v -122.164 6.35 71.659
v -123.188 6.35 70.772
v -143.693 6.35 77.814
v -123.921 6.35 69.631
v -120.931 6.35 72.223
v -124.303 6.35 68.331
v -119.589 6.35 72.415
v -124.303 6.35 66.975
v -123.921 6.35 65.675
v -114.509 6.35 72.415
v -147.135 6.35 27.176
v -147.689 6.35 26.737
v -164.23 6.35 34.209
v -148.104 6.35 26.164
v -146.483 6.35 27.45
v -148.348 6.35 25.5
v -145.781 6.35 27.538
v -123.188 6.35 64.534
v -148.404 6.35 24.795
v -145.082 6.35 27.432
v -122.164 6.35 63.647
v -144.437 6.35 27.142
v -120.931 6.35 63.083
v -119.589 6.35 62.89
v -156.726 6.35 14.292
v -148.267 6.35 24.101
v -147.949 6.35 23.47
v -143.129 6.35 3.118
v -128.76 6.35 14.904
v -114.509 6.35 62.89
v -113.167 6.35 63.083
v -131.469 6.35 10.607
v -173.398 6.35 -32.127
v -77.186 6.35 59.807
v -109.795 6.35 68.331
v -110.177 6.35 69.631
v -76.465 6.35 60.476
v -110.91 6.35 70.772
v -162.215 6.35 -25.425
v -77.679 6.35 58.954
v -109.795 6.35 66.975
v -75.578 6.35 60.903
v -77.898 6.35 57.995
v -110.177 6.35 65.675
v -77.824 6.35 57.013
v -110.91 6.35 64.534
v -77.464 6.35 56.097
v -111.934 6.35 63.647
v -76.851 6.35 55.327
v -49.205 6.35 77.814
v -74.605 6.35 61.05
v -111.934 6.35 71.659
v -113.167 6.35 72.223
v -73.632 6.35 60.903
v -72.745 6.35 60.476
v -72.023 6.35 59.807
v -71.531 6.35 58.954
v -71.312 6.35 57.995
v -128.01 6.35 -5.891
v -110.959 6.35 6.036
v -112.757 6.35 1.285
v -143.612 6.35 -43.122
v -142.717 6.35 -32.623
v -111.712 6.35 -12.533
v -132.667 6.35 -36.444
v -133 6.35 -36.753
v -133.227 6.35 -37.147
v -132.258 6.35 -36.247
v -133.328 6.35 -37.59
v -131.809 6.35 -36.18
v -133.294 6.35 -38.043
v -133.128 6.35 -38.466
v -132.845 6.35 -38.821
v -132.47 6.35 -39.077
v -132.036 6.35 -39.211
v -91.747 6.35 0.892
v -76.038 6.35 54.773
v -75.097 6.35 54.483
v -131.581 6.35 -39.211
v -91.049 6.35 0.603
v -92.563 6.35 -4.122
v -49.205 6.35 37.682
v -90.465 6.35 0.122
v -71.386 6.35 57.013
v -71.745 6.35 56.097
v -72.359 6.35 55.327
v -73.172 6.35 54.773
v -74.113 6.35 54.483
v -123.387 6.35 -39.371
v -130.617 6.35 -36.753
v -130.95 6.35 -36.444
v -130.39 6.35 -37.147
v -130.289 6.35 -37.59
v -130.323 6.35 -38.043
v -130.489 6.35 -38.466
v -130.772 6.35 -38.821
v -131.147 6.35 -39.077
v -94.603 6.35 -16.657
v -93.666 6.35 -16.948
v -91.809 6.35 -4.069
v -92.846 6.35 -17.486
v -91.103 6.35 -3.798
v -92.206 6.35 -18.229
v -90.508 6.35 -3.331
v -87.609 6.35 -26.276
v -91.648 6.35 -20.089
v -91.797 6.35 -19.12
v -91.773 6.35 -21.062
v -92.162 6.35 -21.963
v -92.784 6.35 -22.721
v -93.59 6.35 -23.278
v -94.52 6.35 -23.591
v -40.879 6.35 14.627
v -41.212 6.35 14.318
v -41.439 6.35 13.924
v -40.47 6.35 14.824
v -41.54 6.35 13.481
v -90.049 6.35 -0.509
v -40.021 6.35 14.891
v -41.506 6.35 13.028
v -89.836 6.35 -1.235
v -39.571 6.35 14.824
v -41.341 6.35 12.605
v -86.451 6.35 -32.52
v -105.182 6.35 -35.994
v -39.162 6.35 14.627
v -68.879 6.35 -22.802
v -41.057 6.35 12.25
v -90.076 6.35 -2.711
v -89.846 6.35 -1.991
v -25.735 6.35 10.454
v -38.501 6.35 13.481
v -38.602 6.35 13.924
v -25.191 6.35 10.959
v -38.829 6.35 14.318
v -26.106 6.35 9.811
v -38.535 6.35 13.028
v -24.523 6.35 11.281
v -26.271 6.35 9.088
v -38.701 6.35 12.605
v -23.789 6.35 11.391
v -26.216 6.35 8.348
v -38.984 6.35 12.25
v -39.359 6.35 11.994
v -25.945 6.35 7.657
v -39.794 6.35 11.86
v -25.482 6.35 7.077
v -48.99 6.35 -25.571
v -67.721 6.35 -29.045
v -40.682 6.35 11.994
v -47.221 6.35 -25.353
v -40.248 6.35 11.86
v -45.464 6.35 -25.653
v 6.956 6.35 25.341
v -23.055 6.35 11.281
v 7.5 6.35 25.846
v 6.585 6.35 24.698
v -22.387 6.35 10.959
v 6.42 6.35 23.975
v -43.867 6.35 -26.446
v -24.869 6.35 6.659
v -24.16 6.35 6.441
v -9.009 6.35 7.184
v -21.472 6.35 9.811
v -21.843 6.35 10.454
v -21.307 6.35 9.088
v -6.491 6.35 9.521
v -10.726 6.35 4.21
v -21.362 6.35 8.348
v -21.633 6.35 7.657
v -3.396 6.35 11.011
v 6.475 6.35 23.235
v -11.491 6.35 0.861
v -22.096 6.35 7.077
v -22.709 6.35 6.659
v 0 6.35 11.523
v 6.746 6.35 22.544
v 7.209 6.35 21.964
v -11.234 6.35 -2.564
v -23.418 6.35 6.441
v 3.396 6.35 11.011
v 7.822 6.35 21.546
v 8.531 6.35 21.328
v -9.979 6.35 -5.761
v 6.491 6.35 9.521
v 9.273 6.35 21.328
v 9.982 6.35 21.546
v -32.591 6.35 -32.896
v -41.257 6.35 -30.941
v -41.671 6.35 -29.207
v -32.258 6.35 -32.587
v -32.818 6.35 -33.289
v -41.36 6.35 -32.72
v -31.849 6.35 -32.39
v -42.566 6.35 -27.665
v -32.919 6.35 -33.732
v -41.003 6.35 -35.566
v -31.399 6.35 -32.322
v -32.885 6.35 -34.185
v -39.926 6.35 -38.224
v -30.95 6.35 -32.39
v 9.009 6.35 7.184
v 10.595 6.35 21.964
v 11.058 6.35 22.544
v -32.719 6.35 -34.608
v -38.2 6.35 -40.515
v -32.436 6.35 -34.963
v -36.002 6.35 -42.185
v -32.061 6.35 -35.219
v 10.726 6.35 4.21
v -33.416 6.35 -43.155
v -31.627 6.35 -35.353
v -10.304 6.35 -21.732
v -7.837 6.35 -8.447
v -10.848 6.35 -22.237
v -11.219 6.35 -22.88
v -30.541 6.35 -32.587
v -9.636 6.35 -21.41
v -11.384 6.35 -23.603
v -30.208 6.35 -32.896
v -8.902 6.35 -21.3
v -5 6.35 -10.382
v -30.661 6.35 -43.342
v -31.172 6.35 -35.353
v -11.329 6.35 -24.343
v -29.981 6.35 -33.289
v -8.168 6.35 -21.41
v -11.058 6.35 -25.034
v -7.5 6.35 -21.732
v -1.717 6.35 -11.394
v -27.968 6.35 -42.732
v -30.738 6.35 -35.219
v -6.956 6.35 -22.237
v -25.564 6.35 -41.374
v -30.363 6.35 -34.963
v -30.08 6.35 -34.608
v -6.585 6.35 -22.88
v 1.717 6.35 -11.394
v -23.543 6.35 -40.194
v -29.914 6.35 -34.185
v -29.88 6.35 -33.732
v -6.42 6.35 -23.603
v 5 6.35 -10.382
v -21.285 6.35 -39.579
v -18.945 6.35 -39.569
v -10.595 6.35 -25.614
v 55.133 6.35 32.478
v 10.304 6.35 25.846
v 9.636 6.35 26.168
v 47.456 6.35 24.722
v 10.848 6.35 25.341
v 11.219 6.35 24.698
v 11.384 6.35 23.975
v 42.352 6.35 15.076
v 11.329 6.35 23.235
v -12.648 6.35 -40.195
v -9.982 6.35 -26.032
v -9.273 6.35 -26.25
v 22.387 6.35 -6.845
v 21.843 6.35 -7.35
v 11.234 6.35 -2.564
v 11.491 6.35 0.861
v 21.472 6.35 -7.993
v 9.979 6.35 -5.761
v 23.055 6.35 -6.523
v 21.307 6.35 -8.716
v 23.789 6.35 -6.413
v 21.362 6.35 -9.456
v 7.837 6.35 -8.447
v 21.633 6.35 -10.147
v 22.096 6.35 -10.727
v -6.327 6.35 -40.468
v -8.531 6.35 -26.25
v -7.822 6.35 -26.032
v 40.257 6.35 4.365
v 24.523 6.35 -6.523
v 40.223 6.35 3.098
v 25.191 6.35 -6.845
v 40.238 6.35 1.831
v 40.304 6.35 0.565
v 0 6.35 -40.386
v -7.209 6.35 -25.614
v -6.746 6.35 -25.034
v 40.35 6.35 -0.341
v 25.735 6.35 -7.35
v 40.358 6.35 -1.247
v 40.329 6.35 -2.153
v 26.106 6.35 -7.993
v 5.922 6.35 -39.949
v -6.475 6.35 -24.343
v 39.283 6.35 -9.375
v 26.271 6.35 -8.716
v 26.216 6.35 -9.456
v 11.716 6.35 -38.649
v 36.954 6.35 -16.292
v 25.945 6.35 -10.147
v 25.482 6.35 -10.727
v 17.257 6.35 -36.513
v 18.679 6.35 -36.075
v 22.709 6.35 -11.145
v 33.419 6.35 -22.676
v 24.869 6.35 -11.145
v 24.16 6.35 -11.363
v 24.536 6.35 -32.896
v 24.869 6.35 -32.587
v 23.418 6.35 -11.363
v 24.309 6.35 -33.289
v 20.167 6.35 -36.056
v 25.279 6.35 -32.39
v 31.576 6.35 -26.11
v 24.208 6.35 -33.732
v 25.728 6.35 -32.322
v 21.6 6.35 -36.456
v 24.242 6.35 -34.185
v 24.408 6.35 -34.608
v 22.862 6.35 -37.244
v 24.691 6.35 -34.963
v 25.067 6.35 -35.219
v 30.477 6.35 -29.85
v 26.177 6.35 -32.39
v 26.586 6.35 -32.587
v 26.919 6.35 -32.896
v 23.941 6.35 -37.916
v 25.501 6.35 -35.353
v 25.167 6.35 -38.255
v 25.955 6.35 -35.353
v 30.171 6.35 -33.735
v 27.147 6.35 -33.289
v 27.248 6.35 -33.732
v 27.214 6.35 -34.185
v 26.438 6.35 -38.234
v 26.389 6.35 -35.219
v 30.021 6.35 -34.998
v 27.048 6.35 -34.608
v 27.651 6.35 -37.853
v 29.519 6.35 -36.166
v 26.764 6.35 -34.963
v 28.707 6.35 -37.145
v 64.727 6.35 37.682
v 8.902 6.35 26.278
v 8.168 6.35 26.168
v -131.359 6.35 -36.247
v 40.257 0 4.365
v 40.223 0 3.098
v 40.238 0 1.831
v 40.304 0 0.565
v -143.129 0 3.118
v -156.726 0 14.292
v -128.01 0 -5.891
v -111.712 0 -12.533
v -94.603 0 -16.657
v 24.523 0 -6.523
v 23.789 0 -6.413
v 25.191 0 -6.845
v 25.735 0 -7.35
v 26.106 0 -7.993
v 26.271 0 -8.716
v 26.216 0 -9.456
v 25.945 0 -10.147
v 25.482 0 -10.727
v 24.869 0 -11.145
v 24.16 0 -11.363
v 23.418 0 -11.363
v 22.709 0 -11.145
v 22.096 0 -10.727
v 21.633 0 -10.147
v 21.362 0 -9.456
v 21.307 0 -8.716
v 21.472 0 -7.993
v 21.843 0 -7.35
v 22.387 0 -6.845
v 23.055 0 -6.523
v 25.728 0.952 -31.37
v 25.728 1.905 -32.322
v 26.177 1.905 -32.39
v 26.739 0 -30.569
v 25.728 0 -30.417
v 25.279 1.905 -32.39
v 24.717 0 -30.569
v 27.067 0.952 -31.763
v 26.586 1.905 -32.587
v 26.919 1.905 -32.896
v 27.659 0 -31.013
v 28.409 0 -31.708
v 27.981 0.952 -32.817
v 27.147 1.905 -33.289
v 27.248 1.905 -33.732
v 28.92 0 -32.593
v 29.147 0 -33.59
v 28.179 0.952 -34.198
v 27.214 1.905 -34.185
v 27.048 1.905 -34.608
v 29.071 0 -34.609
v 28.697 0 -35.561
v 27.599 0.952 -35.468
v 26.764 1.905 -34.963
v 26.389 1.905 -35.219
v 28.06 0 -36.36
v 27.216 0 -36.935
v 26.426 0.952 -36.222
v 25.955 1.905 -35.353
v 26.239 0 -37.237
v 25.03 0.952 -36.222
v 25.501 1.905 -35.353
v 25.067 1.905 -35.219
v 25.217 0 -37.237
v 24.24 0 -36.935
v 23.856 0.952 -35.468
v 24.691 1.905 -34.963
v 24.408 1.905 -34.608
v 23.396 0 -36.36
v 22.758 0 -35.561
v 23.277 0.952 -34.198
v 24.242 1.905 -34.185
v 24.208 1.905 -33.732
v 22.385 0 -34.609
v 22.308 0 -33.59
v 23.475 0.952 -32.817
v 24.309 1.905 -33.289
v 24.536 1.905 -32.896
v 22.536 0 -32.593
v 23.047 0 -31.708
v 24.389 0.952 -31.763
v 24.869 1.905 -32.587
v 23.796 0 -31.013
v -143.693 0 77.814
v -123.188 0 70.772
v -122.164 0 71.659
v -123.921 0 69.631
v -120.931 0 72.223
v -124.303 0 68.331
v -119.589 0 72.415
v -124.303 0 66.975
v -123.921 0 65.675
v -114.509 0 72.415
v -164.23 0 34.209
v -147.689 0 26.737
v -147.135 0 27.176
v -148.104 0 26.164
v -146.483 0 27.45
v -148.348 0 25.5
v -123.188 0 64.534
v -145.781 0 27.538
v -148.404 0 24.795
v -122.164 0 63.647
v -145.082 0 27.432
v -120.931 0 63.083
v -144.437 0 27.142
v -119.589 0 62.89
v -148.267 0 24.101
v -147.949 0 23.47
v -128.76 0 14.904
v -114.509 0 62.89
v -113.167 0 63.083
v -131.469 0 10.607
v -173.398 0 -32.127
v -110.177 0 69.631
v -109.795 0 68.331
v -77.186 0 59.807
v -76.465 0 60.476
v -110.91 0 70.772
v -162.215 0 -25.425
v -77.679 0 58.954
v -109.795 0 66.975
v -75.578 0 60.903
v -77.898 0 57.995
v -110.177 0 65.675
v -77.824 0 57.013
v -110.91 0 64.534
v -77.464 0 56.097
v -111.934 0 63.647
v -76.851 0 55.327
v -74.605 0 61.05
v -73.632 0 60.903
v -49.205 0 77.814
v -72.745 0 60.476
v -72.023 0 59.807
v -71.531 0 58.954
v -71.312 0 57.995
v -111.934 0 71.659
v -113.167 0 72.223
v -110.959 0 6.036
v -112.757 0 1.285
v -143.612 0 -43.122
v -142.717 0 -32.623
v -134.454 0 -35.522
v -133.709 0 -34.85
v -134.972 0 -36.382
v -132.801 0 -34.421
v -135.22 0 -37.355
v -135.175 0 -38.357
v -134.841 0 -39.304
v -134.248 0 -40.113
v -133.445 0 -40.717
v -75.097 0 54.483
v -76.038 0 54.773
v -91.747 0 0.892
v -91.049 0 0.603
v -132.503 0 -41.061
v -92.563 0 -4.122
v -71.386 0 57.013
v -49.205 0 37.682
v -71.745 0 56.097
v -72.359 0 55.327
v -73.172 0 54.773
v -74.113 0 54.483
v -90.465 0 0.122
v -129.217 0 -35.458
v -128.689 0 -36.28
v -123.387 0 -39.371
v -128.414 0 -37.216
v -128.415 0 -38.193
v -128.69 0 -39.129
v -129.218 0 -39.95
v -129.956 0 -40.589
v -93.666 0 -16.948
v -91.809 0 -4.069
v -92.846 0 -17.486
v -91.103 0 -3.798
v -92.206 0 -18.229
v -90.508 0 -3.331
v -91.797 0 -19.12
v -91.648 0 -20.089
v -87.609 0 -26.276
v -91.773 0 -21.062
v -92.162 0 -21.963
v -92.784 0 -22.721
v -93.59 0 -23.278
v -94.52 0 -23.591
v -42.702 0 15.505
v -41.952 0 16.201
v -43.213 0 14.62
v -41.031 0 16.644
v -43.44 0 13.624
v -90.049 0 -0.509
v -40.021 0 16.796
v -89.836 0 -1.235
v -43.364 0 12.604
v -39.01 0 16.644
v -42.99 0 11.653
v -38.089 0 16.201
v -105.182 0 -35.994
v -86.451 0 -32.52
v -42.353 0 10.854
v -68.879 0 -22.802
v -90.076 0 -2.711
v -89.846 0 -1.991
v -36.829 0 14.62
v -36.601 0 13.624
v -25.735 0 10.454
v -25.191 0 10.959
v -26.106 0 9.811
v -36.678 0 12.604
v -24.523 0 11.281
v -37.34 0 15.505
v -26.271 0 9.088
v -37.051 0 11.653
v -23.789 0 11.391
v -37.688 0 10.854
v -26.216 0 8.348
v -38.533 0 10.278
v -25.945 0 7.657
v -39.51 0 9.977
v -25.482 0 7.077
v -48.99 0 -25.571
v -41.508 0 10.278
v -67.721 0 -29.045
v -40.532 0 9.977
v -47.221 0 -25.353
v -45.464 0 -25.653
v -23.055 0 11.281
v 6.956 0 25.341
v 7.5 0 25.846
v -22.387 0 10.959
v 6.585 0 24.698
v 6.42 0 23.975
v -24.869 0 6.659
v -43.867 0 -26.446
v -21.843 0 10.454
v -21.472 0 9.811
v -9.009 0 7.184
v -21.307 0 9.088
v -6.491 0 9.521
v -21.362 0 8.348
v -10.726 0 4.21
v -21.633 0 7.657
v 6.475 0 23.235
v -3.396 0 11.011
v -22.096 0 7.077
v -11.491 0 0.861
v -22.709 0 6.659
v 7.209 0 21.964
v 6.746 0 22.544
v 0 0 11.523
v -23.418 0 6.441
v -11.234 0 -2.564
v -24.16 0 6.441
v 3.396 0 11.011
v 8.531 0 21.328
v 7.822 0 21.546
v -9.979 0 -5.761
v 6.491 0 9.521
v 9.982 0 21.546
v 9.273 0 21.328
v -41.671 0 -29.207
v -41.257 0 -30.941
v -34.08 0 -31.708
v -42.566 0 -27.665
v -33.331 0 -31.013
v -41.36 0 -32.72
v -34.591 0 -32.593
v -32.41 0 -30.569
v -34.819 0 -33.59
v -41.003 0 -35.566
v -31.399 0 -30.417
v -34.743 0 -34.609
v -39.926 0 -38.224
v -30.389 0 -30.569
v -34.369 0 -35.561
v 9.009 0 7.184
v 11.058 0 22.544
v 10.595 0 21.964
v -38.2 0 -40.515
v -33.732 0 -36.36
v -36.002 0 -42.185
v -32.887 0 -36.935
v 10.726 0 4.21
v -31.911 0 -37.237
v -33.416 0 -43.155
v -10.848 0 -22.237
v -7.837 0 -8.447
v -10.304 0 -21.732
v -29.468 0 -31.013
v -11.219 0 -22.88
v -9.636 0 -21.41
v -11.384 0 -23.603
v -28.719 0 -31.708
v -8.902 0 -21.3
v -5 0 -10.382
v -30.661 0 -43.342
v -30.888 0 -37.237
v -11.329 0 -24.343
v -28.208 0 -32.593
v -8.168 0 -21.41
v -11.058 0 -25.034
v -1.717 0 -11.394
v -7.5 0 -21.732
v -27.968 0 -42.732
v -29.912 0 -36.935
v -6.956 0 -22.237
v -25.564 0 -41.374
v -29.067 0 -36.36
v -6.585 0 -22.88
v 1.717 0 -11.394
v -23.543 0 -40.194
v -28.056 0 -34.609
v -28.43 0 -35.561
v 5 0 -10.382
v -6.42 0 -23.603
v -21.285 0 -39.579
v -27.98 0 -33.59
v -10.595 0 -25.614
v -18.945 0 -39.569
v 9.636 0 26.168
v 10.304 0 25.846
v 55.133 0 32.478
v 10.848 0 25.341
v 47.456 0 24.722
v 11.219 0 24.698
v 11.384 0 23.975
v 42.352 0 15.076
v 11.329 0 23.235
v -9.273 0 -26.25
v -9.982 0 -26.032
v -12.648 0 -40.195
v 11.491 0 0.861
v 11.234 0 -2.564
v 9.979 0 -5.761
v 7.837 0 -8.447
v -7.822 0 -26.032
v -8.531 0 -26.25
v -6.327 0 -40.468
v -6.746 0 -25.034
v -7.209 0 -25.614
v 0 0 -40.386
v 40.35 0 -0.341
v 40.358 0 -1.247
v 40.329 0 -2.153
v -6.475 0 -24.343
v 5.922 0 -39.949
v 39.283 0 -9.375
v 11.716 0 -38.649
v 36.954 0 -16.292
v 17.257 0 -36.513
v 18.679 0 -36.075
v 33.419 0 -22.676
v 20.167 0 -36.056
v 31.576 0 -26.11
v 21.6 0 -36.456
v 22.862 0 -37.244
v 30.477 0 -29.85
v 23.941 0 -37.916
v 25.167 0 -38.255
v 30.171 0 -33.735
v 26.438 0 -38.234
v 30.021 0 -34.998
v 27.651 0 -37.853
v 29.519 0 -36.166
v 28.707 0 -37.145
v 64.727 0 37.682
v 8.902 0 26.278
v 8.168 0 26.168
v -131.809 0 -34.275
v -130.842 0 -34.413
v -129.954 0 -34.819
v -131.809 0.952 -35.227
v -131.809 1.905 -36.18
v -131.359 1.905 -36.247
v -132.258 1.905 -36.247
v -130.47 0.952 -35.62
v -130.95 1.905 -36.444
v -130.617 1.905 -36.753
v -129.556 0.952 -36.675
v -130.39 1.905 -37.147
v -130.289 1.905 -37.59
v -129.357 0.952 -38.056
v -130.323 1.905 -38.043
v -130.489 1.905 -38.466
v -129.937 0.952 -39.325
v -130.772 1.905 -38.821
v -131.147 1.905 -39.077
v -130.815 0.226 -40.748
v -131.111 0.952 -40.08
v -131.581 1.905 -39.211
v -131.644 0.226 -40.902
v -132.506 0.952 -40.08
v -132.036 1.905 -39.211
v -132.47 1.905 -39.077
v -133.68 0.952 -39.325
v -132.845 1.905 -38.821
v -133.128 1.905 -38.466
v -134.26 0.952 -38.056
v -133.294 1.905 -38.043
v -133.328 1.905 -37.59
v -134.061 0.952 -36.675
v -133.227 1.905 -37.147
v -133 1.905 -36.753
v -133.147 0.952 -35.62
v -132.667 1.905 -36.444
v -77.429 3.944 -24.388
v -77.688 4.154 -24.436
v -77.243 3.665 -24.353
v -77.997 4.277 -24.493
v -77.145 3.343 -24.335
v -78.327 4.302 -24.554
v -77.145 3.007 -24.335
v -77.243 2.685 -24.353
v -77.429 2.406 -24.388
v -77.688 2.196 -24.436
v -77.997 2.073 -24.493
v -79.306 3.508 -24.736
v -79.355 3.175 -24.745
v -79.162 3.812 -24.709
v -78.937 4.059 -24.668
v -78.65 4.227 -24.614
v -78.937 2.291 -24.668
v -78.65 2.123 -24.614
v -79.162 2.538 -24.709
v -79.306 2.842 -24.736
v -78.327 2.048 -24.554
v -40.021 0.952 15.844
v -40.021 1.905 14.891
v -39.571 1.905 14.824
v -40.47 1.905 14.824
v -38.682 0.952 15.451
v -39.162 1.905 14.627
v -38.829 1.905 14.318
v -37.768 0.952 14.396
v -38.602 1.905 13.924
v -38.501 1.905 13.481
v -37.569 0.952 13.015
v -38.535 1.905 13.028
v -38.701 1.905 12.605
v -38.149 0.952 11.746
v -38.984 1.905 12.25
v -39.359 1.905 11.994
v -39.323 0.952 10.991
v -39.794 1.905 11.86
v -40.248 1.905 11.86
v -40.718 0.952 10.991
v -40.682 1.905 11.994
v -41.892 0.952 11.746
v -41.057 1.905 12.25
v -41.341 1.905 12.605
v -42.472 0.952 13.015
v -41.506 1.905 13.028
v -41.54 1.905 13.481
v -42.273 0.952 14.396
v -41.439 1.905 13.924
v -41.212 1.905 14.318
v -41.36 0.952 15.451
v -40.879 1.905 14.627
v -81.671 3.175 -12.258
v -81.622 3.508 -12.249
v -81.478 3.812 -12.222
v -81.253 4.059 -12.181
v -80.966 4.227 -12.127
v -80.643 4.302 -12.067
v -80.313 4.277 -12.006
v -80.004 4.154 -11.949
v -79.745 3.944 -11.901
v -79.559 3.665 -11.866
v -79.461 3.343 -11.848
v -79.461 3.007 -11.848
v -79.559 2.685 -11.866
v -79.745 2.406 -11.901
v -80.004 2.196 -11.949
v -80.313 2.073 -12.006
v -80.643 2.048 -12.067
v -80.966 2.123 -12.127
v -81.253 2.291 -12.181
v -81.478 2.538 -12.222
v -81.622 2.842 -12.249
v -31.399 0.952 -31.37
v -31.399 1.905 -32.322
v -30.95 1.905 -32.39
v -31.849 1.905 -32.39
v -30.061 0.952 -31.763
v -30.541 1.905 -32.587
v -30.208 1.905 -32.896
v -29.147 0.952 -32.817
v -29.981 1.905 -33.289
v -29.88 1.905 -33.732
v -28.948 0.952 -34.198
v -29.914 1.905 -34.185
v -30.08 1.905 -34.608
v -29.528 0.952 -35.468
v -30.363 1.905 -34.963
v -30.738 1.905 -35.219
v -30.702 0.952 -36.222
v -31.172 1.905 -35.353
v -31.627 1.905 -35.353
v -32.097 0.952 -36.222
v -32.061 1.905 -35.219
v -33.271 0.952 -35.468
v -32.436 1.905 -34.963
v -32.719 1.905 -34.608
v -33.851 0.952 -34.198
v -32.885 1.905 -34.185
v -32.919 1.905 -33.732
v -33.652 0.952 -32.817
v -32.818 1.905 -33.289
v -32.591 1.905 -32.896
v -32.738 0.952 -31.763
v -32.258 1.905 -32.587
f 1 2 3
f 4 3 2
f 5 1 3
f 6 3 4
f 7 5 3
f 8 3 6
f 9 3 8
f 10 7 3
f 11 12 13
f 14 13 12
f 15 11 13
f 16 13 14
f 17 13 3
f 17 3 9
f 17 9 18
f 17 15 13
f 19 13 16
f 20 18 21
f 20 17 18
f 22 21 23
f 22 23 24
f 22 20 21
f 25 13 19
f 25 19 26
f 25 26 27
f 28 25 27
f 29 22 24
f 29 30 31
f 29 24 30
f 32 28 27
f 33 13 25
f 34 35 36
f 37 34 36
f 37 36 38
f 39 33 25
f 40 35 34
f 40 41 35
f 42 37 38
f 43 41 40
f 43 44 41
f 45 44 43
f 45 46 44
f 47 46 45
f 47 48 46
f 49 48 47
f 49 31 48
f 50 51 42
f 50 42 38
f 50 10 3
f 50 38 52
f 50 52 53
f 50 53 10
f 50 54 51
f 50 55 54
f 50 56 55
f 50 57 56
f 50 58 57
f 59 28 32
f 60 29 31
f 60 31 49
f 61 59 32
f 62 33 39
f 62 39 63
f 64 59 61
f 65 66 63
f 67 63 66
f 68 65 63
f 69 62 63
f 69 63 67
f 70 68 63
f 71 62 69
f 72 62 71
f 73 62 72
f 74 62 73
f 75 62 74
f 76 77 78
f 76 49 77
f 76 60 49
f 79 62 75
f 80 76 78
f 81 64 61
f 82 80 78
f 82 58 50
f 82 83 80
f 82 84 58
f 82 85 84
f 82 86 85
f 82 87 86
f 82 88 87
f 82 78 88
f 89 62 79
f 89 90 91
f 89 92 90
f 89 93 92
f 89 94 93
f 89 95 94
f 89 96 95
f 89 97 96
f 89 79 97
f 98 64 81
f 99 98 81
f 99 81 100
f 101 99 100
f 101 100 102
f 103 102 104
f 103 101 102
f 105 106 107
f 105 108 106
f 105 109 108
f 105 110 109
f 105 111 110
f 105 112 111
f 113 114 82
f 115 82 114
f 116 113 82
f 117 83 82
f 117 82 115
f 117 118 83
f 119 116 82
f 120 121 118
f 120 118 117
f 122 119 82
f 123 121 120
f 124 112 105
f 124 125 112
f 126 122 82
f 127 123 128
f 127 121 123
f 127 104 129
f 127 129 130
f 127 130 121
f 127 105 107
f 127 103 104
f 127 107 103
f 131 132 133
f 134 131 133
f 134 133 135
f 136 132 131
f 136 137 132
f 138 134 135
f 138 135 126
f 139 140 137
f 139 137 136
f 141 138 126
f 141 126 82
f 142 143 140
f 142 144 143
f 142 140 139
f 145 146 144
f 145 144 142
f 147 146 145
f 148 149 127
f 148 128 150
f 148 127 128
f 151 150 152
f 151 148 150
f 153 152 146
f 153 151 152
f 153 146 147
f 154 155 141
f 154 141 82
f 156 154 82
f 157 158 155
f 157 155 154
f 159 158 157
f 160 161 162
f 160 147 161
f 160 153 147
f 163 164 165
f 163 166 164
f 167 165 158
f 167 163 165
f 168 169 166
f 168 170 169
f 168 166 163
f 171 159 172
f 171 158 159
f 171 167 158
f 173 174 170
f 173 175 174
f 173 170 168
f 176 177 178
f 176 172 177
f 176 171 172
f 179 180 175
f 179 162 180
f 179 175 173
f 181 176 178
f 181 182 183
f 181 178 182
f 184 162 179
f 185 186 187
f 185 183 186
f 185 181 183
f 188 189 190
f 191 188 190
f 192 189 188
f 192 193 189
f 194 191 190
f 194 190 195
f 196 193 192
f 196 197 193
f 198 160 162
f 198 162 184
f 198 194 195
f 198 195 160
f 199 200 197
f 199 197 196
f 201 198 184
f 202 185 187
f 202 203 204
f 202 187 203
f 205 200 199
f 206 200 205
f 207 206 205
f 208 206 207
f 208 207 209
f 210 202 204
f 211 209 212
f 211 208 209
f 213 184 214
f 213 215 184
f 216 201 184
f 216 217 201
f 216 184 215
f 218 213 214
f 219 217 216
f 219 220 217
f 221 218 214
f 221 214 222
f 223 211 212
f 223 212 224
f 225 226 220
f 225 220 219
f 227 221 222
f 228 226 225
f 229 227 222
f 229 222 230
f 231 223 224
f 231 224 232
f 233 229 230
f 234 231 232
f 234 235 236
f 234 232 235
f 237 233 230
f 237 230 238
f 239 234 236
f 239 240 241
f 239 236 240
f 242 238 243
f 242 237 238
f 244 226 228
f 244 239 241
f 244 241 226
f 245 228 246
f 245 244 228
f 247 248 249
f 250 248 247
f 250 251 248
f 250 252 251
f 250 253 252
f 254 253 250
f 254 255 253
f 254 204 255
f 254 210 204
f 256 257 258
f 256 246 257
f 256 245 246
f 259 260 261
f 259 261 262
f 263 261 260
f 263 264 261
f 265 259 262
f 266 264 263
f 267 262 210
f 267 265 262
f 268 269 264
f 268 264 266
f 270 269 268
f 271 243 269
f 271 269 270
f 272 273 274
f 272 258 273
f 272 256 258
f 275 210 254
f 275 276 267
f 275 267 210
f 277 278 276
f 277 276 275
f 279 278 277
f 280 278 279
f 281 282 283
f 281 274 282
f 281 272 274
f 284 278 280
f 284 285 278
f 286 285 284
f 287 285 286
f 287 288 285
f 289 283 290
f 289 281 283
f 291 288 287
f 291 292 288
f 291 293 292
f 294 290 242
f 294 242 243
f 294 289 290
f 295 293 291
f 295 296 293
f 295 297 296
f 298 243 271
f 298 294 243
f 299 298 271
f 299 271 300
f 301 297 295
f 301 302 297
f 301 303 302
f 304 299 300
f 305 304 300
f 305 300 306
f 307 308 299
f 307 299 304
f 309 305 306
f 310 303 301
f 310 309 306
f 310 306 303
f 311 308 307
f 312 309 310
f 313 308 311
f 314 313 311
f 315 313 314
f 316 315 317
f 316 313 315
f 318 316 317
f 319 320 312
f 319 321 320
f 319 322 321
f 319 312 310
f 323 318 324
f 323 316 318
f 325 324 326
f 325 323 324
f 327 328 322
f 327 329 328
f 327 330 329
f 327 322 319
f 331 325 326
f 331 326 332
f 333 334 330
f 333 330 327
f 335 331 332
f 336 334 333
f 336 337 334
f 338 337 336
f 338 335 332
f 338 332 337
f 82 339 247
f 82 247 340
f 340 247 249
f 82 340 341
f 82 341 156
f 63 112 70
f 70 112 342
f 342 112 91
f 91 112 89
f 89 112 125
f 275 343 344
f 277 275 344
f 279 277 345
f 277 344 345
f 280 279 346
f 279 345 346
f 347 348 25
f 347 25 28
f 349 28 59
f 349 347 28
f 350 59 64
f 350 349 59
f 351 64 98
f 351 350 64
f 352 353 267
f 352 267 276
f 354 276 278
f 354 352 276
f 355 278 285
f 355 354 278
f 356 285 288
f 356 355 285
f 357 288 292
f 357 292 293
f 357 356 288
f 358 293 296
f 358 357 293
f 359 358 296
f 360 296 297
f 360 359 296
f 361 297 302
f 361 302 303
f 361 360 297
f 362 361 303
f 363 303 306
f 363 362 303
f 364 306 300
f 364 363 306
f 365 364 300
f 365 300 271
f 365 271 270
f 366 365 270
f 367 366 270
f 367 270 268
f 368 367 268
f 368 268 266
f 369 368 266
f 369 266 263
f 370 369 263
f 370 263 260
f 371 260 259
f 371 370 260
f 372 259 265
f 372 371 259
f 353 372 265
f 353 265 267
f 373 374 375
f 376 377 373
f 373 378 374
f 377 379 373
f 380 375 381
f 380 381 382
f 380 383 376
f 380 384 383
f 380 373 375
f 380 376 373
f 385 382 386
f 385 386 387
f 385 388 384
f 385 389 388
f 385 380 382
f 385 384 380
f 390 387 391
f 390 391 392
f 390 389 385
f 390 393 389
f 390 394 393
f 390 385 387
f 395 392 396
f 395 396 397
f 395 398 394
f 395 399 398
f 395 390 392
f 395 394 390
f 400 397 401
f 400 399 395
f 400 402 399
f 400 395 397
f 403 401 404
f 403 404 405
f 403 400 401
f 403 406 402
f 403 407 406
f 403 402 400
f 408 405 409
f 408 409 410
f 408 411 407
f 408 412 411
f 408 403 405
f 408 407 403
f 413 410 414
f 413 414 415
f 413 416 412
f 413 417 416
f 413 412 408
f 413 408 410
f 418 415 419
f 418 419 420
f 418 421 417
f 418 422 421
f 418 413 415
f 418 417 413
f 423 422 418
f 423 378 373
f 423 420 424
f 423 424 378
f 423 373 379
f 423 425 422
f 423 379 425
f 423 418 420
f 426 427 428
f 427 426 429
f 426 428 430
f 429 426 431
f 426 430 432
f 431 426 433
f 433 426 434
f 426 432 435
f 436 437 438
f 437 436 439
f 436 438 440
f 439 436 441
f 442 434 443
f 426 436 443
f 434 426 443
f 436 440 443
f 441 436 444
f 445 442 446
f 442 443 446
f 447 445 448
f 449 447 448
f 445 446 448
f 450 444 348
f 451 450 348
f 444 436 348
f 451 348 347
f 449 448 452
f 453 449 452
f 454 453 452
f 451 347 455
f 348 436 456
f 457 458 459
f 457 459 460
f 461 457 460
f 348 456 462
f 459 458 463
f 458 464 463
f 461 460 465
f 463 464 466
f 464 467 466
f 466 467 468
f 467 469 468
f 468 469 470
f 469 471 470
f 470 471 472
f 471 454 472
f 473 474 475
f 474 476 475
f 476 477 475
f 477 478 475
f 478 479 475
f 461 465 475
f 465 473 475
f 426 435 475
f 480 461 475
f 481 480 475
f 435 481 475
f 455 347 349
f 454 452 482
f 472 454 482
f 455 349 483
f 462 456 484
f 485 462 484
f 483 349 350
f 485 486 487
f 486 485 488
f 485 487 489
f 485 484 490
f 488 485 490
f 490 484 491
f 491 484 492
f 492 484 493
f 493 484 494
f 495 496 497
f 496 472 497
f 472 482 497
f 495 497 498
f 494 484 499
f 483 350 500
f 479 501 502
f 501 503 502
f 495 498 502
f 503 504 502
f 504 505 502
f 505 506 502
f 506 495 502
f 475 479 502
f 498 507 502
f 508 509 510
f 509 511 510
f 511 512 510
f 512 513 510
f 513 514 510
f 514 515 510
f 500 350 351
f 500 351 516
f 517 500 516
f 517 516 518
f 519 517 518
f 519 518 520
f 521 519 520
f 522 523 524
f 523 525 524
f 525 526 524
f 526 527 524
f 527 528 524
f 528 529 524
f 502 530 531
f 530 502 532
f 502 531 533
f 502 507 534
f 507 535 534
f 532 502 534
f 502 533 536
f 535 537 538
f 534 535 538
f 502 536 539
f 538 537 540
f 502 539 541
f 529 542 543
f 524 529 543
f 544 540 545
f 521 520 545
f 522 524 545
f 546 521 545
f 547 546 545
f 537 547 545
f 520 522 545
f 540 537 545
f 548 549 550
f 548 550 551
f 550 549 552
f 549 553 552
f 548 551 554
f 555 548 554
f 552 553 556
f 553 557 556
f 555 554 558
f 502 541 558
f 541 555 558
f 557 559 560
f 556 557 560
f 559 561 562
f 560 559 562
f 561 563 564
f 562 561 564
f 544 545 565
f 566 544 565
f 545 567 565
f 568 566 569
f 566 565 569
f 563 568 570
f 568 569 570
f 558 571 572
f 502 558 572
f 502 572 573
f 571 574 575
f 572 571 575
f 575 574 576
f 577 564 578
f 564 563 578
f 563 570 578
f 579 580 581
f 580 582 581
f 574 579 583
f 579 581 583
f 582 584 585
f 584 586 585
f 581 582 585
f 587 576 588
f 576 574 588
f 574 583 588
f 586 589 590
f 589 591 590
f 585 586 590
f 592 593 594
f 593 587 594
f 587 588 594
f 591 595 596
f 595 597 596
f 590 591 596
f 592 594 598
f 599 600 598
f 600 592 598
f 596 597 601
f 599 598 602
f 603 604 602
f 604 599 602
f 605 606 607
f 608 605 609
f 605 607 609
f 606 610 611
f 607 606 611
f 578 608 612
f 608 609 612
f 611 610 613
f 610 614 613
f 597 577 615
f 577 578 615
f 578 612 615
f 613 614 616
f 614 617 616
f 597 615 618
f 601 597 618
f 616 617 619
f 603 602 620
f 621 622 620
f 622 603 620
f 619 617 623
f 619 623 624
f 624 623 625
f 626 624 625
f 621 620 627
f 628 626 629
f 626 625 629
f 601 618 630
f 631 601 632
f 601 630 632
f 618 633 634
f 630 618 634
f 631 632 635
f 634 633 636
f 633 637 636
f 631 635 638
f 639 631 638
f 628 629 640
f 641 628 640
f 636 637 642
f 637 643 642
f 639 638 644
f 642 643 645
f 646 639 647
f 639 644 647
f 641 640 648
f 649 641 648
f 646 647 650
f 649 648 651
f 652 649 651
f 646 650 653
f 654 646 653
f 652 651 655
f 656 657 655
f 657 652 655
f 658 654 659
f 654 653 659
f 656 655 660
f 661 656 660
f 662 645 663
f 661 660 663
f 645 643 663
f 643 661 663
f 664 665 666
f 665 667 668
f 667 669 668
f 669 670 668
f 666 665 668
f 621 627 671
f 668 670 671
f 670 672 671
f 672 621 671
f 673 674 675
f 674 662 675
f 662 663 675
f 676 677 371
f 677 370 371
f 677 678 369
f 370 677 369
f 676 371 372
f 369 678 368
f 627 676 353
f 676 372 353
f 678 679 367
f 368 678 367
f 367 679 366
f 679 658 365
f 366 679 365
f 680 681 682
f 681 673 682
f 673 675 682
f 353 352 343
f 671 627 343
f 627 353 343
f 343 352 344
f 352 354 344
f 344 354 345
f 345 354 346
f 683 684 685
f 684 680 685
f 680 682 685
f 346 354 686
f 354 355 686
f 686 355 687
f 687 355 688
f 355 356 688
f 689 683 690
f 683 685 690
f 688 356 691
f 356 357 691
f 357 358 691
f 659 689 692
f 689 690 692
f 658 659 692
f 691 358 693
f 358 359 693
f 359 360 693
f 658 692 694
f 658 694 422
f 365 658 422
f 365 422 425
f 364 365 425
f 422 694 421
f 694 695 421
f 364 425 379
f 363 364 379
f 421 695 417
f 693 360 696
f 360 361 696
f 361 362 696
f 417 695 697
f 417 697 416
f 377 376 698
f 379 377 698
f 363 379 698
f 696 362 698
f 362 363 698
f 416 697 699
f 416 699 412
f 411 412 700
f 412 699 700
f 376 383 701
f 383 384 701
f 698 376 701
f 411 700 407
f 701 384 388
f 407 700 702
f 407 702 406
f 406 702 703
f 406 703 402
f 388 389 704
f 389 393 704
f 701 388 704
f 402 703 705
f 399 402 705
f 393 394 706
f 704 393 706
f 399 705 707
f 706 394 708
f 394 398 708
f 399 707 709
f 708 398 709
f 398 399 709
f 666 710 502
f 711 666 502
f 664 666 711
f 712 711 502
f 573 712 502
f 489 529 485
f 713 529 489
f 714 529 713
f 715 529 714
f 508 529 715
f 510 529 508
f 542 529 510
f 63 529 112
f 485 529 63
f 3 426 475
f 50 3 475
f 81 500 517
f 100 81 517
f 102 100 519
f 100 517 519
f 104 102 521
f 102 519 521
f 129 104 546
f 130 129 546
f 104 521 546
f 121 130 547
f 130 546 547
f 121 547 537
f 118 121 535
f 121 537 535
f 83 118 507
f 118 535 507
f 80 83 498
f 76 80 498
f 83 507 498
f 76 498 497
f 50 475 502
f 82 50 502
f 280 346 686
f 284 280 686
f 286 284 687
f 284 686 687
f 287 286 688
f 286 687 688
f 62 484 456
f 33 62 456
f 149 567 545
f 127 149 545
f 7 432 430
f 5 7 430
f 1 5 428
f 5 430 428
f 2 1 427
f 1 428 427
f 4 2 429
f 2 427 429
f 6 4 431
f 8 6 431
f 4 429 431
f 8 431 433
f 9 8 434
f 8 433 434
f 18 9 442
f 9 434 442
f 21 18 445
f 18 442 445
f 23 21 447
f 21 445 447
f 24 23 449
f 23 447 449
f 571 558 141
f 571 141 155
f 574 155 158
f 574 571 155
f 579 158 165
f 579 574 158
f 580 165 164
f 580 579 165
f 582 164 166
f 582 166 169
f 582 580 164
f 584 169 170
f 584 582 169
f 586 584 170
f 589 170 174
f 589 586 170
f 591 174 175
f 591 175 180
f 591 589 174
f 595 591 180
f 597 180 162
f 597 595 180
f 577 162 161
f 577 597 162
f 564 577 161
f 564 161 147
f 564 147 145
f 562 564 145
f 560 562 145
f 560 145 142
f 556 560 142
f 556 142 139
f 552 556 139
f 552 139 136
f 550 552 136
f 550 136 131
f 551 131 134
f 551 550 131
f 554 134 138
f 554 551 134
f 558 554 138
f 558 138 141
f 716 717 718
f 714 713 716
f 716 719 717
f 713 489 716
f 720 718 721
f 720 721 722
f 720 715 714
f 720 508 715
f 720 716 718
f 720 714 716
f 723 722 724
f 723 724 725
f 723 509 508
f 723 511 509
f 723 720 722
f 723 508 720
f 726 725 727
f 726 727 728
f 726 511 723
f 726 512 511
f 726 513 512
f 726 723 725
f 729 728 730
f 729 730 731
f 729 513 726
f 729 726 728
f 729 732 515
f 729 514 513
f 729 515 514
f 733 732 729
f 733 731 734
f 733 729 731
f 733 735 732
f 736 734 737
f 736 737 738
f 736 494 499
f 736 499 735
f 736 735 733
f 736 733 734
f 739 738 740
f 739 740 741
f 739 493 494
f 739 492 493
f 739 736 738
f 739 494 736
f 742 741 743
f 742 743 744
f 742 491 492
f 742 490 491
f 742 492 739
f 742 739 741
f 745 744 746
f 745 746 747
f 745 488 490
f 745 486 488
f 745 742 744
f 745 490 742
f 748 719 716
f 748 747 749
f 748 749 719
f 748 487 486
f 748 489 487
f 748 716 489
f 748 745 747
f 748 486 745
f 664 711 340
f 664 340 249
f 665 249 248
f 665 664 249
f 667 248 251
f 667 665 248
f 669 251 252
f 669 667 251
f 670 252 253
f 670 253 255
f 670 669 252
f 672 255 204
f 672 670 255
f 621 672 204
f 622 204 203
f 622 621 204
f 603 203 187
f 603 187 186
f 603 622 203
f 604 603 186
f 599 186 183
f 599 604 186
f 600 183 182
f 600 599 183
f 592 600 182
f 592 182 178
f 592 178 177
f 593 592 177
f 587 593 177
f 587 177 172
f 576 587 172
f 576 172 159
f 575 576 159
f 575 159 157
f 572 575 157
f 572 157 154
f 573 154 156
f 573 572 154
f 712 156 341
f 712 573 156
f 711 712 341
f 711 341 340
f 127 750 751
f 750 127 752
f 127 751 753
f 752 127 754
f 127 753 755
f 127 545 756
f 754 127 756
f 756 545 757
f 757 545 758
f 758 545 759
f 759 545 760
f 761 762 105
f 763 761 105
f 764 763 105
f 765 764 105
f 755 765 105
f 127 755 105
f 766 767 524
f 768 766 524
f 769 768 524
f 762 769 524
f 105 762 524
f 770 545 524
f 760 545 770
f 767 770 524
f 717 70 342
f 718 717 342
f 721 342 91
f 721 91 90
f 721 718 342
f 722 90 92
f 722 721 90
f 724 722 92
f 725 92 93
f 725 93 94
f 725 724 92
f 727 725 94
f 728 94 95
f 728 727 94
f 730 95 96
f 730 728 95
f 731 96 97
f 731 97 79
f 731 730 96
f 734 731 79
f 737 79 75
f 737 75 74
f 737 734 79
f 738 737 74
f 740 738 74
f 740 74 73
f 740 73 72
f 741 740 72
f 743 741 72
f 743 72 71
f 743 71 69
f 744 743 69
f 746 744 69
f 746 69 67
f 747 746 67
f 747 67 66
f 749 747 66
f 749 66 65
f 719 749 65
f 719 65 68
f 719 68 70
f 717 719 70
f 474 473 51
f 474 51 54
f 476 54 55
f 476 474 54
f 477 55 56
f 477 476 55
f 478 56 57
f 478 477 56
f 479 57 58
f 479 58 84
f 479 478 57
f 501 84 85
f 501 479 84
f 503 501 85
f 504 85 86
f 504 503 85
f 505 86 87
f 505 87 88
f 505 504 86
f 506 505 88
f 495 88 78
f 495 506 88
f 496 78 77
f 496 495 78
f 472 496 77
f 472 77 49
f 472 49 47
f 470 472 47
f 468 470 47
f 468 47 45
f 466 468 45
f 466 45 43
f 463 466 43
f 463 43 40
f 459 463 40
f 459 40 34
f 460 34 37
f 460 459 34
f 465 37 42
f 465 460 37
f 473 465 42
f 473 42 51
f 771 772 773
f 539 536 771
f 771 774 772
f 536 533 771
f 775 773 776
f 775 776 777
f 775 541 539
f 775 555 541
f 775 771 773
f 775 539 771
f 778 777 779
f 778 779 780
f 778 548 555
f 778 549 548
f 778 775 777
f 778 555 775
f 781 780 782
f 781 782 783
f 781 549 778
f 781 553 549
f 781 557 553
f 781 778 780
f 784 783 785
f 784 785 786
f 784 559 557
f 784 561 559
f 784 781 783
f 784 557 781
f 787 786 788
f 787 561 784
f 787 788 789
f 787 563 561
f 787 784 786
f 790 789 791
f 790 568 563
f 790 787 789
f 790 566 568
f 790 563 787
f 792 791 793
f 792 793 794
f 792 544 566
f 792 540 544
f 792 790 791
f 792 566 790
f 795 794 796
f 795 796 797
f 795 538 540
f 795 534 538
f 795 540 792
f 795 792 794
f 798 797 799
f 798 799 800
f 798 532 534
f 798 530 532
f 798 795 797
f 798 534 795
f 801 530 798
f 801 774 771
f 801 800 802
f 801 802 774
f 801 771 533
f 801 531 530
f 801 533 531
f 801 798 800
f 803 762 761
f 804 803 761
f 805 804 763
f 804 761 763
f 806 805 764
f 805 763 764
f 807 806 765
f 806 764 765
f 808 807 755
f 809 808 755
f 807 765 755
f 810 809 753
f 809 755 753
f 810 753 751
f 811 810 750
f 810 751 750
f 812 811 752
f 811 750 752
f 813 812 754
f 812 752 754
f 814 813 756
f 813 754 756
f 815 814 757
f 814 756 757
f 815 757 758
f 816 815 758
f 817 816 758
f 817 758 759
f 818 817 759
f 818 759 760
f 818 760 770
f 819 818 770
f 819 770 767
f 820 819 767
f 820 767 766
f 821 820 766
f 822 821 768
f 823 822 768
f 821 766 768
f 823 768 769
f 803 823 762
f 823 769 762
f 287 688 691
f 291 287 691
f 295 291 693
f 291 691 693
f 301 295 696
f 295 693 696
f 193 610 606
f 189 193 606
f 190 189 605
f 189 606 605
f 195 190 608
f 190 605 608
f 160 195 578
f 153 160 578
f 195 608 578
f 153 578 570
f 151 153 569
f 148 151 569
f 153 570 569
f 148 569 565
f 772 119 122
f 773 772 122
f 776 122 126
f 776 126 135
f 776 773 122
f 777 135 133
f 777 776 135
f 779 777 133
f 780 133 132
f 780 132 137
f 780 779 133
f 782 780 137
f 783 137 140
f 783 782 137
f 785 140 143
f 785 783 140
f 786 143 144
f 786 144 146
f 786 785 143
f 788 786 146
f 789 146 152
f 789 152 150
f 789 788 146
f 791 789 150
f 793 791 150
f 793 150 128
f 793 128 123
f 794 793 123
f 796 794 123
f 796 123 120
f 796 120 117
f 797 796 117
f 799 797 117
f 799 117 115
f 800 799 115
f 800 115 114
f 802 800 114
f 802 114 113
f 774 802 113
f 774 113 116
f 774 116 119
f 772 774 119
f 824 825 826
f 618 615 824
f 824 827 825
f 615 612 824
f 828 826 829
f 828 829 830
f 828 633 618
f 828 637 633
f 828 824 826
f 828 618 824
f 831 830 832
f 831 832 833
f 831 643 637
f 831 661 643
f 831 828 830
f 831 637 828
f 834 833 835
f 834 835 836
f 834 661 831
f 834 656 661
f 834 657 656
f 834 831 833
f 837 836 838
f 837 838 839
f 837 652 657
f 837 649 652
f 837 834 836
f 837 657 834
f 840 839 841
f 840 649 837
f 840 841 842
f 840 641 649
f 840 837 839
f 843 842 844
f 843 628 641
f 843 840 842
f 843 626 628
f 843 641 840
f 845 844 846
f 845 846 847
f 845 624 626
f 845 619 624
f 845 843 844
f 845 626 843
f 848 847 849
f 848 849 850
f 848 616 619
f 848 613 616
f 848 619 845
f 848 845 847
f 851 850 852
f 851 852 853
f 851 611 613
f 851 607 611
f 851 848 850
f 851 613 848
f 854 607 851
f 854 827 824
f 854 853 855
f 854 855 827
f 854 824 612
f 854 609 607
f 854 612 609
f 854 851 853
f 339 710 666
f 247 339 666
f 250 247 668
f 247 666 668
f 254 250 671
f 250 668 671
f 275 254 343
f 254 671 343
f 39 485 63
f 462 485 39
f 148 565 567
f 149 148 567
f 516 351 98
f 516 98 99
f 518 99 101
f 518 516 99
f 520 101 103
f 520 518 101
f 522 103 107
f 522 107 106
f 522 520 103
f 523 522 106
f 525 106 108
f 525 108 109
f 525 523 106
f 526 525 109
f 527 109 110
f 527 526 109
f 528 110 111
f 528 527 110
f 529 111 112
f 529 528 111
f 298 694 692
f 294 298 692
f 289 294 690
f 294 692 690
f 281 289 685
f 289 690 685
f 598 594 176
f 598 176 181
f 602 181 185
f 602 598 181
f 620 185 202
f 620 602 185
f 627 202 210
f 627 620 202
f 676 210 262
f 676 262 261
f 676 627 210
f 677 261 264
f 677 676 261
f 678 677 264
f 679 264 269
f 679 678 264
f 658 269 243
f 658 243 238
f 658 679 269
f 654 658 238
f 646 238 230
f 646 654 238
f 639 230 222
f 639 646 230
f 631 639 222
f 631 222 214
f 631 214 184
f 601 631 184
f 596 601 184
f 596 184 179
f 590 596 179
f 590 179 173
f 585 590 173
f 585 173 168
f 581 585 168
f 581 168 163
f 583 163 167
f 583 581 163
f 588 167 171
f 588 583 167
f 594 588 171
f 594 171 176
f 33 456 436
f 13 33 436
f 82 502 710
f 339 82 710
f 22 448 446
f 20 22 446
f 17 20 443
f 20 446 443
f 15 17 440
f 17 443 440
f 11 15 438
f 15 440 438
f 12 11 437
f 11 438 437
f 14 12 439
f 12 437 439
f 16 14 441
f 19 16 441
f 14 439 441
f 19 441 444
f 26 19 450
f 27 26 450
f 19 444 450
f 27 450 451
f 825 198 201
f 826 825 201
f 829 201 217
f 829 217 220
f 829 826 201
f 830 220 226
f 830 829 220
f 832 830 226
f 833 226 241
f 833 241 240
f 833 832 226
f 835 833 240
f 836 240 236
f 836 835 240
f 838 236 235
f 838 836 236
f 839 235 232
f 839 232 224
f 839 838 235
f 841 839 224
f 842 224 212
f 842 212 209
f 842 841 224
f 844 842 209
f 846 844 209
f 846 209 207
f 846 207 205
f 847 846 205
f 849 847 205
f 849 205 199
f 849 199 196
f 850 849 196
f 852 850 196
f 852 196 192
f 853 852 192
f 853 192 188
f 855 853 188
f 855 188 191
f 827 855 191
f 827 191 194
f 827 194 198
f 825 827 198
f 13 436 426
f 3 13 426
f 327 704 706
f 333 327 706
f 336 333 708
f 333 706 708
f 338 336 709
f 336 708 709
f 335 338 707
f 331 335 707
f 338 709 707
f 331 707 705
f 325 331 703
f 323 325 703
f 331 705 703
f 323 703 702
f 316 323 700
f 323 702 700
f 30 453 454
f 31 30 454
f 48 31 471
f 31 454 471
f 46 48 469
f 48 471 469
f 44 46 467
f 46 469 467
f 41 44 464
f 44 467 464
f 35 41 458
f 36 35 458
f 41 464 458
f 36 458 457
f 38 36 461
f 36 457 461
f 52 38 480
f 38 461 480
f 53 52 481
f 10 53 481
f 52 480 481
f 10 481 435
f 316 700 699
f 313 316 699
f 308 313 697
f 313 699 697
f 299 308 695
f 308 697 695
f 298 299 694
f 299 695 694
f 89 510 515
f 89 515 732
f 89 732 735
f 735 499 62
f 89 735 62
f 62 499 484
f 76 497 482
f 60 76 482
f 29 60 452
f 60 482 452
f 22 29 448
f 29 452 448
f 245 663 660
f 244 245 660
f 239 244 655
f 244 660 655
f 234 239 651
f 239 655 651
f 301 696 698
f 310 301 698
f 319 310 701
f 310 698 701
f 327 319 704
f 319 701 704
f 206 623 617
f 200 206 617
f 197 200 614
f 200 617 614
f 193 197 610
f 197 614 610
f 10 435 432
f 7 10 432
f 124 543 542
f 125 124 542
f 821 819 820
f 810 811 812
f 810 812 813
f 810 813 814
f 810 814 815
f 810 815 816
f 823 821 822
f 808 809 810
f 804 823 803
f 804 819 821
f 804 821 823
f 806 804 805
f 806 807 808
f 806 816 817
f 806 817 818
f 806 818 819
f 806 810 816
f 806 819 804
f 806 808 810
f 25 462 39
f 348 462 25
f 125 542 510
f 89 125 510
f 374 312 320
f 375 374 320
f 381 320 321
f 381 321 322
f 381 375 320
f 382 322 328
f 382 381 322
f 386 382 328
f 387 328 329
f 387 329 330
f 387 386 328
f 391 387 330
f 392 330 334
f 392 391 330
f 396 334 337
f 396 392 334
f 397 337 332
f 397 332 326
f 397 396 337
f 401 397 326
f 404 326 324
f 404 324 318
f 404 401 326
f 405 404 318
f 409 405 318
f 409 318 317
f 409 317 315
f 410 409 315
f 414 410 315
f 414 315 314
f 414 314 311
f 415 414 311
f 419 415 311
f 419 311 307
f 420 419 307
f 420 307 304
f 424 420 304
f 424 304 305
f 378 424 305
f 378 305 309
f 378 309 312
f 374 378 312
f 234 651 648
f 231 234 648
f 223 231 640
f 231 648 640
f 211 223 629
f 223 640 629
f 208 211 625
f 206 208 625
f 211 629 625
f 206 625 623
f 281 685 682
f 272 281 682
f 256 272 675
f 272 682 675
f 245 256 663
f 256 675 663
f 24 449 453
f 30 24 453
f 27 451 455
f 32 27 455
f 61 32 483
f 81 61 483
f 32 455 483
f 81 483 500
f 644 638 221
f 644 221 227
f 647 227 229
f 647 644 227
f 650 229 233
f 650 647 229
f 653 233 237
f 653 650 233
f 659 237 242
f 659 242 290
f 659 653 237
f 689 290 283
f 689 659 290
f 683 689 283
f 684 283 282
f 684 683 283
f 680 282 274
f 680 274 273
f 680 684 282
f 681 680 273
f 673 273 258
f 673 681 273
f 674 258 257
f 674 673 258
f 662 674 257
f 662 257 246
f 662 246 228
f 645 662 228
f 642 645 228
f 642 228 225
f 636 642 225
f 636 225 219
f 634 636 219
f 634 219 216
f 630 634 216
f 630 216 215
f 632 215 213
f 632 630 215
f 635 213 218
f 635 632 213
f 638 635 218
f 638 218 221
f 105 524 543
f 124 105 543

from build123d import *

# Parameters (mm, degrees)
SKETCH1_R           = 1.524
SKETCH1_R_2         = 2.4892
SKETCH1_R_3         = 11.522750336
SKETCH1_R_4         = 3.302
BOSS_EXTRUDE1_DEPTH = 6.35
CHAMFER1_SIZE       = 1.905
SKETCH2_R           = 1.1303
CUT_EXTRUDE1_DEPTH  = 12.7


with BuildPart() as part:
    # Sketch1 → Boss-Extrude1 (new body)
    with BuildSketch(Plane(origin=(0, 0, 0), x_dir=(1, 0, 0), z_dir=(0, 1, 0))):
        with BuildLine():
            Line((-48.989983611, 25.571283439), (-67.720507172, 29.04547214))
            Line((-67.720507172, 29.04547214), (-68.878570072, 22.801964286))
            Line((-68.878570072, 22.801964286), (-87.609093633, 26.276152988))
            Line((-87.609093633, 26.276152988), (-86.451030733, 32.519660841))
            Line((-86.451030733, 32.519660841), (-105.181554294, 35.993849543))
            Line((-105.181554294, 35.993849543), (-123.386535507, 39.370559213))
            Line((-123.386535507, 39.370559213), (-143.61245558, 43.122118146))
            Line((-143.61245558, 43.122118146), (-173.397808446, 32.126880331))
            Line((-173.397808446, 32.126880331), (-164.230158466, -34.209448348))
            Line((-164.230158466, -34.209448348), (-143.692879271, -77.813892282))
            Line((-143.692879271, -77.813892282), (-76.563330949, -77.813892282))
            Line((-76.563330949, -77.813892282), (-49.204879271, -77.813892282))
            Line((-49.204879271, -77.813892282), (-49.204879271, -37.681892282))
            Line((-49.204879271, -37.681892282), (45.277962712, -37.681892282))
            Line((45.277962712, -37.681892282), (64.72671994, -37.681892282))
            ThreePointArc((64.72671994, -37.681892282), (47.456106683, -24.721818432), (40.256527969, -4.364911427))
            ThreePointArc((40.256527969, -4.364911427), (40.224315343, -2.464216219), (40.304028245, -0.564920092))
            ThreePointArc((40.304028245, -0.564920092), (40.358687129, 0.79375425), (40.328560009, 2.153193811))
            ThreePointArc((40.328560009, 2.153193811), (38.274981353, 12.886225143), (33.41911498, 22.675796566))
            ThreePointArc((33.41911498, 22.675796566), (30.929713329, 27.951337515), (30.171477502, 33.73524029))
            ThreePointArc((30.171477502, 33.73524029), (27.651370411, 37.853265988), (22.862043617, 37.243820127))
            ThreePointArc((22.862043617, 37.243820127), (20.166682607, 36.055874133), (17.256896531, 36.513401897))
            ThreePointArc((17.256896531, 36.513401897), (8.843040964, 39.405959226), (0, 40.386))
            ThreePointArc((0, 40.386), (-9.489488111, 40.375548652), (-18.94466273, 39.569219451))
            ThreePointArc((-18.94466273, 39.569219451), (-22.43398811, 39.812343861), (-25.563809609, 41.373983535))
            ThreePointArc((-25.563809609, 41.373983535), (-32.045487778, 43.349075748), (-38.20024979, 40.514989348))
            ThreePointArc((-38.20024979, 40.514989348), (-40.550934903, 36.930082806), (-41.360215512, 32.720291801))
            ThreePointArc((-41.360215512, 32.720291801), (-43.17208429, 27.008072674), (-48.989983611, 25.571283439))
        make_face()
        with Locations(Location((-131.808500509, 37.703534036, 0), (0, 0, 270))):
            Circle(SKETCH1_R, mode=Mode.SUBTRACT)
        with Locations(Location((-31.399492492, 33.846007028, 0), (0, 0, 270))):
            Circle(SKETCH1_R, mode=Mode.SUBTRACT)
        with Locations(Location((-23.788932991, -8.902059713, 0), (0, 0, 270))):
            Circle(SKETCH1_R_2, mode=Mode.SUBTRACT)
        with Locations(Location((8.902059713, -23.788932991, 0), (0, 0, 270))):
            Circle(SKETCH1_R_2, mode=Mode.SUBTRACT)
        with Locations(Location((-8.902059713, 23.788932991, 0), (0, 0, 270))):
            Circle(SKETCH1_R_2, mode=Mode.SUBTRACT)
        with Locations(Location((23.788932991, 8.902059713, 0), (0, 0, 270))):
            Circle(SKETCH1_R_2, mode=Mode.SUBTRACT)
        with Locations(Location((0, 0, 0), (0, 0, 270))):
            Circle(SKETCH1_R_3, mode=Mode.SUBTRACT)
        with Locations(Location((-74.604879271, -57.747892282, 0), (0, 0, 270))):
            Circle(SKETCH1_R_4, mode=Mode.SUBTRACT)
        with Locations(Location((-40.020695033, -13.367428306, 0), (0, 0, 270))):
            Circle(SKETCH1_R, mode=Mode.SUBTRACT)
        with Locations(Location((25.727857837, 33.846007028, 0), (0, 0, 270))):
            Circle(SKETCH1_R, mode=Mode.SUBTRACT)
        with BuildLine():
            Line((-142.716614997, 32.622661546), (-162.215024972, 25.424839998))
            Line((-162.215024972, 25.424839998), (-156.726187504, -14.291916991))
            ThreePointArc((-156.726187504, -14.291916991), (-128.01028366, 5.891204618), (-94.602827713, 16.657049623))
            ThreePointArc((-94.602827713, 16.657049623), (-91.648290045, 20.089389422), (-94.519859105, 23.59143746))
            Line((-94.519859105, 23.59143746), (-142.716614997, 32.622661546))
        make_face(mode=Mode.SUBTRACT)
        with BuildLine():
            Line((-114.508797405, -72.415483536), (-119.588797405, -72.415483536))
            ThreePointArc((-119.588797405, -72.415483536), (-124.351297405, -67.652983536), (-119.588797405, -62.890483536))
            Line((-119.588797405, -62.890483536), (-114.508797405, -62.890483536))
            ThreePointArc((-114.508797405, -62.890483536), (-109.746297405, -67.652983536), (-114.508797405, -72.415483536))
        make_face(mode=Mode.SUBTRACT)
        with BuildLine():
            ThreePointArc((-147.948535824, -23.470306336), (-122.347176599, -5.47625853), (-92.563113904, 4.121916294))
            ThreePointArc((-92.563113904, 4.121916294), (-89.845720269, 1.990682905), (-91.74722838, -0.892137038))
            ThreePointArc((-91.74722838, -0.892137038), (-120.081933775, -10.023243789), (-144.437475152, -27.141662075))
            ThreePointArc((-144.437475152, -27.141662075), (-147.689154448, -26.736809805), (-147.948535824, -23.470306336))
        make_face(mode=Mode.SUBTRACT)
    extrude(amount=BOSS_EXTRUDE1_DEPTH)

    # Chamfer1
    # the kernel refuses this chamfer: 1.905 mm, written as the material it takes off along each edge
    with BuildSketch(Plane(origin=(-131.808500509, 0, -37.703534036), x_dir=(0, 0, 1), z_dir=(-1, 0, 0))) as chamfer1_piece_1:
        Polygon((1.524, CHAMFER1_SIZE), (1.524 + CHAMFER1_SIZE, 0), (1.524, 0), align=None)
    revolve(axis=Axis((-131.808500509, 0, -37.703534036), (0, 1, 0)), mode=Mode.SUBTRACT)
    with BuildSketch(Plane(origin=(-40.020695033, 0, 13.367428306), x_dir=(0, 0, 1), z_dir=(-1, 0, 0))) as chamfer1_piece_2:
        Polygon((1.524, CHAMFER1_SIZE), (1.524 + CHAMFER1_SIZE, 0), (1.524, 0), align=None)
    revolve(axis=Axis((-40.020695033, 0, 13.367428306), (0, 1, 0)), mode=Mode.SUBTRACT)
    with BuildSketch(Plane(origin=(25.727857837, 0, -33.846007028), x_dir=(0, 0, 1), z_dir=(-1, 0, 0))) as chamfer1_piece_3:
        Polygon((1.524, CHAMFER1_SIZE), (1.524 + CHAMFER1_SIZE, 0), (1.524, 0), align=None)
    revolve(axis=Axis((25.727857837, 0, -33.846007028), (0, 1, 0)), mode=Mode.SUBTRACT)
    with BuildSketch(Plane(origin=(-31.399492492, 0, -33.846007028), x_dir=(0, 0, 1), z_dir=(-1, 0, 0))) as chamfer1_piece_4:
        Polygon((1.524, CHAMFER1_SIZE), (1.524 + CHAMFER1_SIZE, 0), (1.524, 0), align=None)
    revolve(axis=Axis((-31.399492492, 0, -33.846007028), (0, 1, 0)), mode=Mode.SUBTRACT)

    # Sketch2 → Cut-Extrude1 (cut)
    with BuildSketch(Plane(origin=(1.797830768, 0, -9.692712298), x_dir=(-0.9832295832535866, 0, -0.18237211029918626), z_dir=(0.18237211029918626, 0, -0.9832295832535866))):
        with Locations((81.406890093, 3.175)):
            Circle(SKETCH2_R)
    extrude(amount=-CUT_EXTRUDE1_DEPTH, mode=Mode.SUBTRACT)


solid = part.part
